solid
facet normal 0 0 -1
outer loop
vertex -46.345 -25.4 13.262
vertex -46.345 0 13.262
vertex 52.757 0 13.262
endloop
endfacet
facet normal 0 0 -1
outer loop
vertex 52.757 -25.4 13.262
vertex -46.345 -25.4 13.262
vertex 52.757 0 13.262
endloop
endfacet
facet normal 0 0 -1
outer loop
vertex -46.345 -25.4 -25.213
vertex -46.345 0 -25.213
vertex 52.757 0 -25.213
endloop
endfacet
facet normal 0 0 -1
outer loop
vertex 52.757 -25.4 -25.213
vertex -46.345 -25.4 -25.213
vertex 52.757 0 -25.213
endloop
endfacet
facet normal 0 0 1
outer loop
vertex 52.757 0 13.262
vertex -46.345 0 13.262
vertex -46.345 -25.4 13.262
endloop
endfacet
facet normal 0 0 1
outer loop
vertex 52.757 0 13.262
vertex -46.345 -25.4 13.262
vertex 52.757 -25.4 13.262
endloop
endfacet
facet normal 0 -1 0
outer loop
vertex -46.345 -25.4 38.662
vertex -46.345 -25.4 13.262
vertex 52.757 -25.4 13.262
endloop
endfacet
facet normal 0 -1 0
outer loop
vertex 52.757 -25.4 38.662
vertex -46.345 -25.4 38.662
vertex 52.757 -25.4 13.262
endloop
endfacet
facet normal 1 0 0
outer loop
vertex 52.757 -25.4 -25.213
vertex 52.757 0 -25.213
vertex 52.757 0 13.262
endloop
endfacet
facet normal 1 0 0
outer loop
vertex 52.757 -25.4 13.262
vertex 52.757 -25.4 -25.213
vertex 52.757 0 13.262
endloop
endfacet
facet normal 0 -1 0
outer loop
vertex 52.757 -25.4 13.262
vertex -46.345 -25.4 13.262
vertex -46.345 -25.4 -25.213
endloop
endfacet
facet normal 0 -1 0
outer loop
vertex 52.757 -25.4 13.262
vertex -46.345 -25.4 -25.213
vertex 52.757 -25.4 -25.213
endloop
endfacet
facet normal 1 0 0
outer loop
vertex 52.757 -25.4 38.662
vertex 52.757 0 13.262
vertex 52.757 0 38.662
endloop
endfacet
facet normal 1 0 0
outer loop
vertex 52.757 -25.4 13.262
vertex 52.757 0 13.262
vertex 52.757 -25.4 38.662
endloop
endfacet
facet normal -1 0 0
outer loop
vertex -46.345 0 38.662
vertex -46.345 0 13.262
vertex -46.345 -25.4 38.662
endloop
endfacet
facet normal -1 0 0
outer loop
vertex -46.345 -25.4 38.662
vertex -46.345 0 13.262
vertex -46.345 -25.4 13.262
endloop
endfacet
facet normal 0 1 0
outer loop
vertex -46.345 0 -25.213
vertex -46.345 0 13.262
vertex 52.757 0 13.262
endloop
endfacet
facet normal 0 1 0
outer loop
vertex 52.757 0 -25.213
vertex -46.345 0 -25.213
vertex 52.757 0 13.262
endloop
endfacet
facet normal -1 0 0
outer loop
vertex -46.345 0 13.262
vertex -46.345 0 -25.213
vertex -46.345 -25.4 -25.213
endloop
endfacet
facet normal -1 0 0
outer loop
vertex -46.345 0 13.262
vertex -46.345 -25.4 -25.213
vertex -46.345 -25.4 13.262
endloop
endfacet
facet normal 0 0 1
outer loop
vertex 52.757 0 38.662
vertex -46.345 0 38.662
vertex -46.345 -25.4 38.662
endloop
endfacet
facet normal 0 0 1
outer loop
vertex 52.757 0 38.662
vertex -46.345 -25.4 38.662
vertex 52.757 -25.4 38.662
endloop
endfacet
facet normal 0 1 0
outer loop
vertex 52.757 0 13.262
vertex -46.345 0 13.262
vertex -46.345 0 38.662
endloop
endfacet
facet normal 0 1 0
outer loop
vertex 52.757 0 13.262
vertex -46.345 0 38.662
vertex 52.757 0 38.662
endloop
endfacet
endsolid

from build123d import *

# Parameters (mm, degrees)
F0_W     = 99.1016365588
F0_H     = 38.474753499
F1_DEPTH = 25.4
F2_DEPTH = 25.4


# Not quite as in the source:
# - a feature of the source that left no trace in its solid (it failed there, or was rolled back) is left out


with BuildPart() as f1:
    # F0 (on Front) → F1 (new body)
    with BuildSketch(Plane.XZ):
        with Locations((3.2062288374, -5.9752464294)):
            Rectangle(F0_W, F0_H)
    extrude(amount=F1_DEPTH)


with BuildPart() as f2:
    # F2 (new): a face of the model
    f2_faces = [f1.part.faces().sort_by_distance(p)[0] for p in [
        (3.2062288374, -12.7, 13.2621303201),
    ]]
    extrude(f2_faces, amount=F2_DEPTH)


solid = Compound([f1.part, f2.part])
